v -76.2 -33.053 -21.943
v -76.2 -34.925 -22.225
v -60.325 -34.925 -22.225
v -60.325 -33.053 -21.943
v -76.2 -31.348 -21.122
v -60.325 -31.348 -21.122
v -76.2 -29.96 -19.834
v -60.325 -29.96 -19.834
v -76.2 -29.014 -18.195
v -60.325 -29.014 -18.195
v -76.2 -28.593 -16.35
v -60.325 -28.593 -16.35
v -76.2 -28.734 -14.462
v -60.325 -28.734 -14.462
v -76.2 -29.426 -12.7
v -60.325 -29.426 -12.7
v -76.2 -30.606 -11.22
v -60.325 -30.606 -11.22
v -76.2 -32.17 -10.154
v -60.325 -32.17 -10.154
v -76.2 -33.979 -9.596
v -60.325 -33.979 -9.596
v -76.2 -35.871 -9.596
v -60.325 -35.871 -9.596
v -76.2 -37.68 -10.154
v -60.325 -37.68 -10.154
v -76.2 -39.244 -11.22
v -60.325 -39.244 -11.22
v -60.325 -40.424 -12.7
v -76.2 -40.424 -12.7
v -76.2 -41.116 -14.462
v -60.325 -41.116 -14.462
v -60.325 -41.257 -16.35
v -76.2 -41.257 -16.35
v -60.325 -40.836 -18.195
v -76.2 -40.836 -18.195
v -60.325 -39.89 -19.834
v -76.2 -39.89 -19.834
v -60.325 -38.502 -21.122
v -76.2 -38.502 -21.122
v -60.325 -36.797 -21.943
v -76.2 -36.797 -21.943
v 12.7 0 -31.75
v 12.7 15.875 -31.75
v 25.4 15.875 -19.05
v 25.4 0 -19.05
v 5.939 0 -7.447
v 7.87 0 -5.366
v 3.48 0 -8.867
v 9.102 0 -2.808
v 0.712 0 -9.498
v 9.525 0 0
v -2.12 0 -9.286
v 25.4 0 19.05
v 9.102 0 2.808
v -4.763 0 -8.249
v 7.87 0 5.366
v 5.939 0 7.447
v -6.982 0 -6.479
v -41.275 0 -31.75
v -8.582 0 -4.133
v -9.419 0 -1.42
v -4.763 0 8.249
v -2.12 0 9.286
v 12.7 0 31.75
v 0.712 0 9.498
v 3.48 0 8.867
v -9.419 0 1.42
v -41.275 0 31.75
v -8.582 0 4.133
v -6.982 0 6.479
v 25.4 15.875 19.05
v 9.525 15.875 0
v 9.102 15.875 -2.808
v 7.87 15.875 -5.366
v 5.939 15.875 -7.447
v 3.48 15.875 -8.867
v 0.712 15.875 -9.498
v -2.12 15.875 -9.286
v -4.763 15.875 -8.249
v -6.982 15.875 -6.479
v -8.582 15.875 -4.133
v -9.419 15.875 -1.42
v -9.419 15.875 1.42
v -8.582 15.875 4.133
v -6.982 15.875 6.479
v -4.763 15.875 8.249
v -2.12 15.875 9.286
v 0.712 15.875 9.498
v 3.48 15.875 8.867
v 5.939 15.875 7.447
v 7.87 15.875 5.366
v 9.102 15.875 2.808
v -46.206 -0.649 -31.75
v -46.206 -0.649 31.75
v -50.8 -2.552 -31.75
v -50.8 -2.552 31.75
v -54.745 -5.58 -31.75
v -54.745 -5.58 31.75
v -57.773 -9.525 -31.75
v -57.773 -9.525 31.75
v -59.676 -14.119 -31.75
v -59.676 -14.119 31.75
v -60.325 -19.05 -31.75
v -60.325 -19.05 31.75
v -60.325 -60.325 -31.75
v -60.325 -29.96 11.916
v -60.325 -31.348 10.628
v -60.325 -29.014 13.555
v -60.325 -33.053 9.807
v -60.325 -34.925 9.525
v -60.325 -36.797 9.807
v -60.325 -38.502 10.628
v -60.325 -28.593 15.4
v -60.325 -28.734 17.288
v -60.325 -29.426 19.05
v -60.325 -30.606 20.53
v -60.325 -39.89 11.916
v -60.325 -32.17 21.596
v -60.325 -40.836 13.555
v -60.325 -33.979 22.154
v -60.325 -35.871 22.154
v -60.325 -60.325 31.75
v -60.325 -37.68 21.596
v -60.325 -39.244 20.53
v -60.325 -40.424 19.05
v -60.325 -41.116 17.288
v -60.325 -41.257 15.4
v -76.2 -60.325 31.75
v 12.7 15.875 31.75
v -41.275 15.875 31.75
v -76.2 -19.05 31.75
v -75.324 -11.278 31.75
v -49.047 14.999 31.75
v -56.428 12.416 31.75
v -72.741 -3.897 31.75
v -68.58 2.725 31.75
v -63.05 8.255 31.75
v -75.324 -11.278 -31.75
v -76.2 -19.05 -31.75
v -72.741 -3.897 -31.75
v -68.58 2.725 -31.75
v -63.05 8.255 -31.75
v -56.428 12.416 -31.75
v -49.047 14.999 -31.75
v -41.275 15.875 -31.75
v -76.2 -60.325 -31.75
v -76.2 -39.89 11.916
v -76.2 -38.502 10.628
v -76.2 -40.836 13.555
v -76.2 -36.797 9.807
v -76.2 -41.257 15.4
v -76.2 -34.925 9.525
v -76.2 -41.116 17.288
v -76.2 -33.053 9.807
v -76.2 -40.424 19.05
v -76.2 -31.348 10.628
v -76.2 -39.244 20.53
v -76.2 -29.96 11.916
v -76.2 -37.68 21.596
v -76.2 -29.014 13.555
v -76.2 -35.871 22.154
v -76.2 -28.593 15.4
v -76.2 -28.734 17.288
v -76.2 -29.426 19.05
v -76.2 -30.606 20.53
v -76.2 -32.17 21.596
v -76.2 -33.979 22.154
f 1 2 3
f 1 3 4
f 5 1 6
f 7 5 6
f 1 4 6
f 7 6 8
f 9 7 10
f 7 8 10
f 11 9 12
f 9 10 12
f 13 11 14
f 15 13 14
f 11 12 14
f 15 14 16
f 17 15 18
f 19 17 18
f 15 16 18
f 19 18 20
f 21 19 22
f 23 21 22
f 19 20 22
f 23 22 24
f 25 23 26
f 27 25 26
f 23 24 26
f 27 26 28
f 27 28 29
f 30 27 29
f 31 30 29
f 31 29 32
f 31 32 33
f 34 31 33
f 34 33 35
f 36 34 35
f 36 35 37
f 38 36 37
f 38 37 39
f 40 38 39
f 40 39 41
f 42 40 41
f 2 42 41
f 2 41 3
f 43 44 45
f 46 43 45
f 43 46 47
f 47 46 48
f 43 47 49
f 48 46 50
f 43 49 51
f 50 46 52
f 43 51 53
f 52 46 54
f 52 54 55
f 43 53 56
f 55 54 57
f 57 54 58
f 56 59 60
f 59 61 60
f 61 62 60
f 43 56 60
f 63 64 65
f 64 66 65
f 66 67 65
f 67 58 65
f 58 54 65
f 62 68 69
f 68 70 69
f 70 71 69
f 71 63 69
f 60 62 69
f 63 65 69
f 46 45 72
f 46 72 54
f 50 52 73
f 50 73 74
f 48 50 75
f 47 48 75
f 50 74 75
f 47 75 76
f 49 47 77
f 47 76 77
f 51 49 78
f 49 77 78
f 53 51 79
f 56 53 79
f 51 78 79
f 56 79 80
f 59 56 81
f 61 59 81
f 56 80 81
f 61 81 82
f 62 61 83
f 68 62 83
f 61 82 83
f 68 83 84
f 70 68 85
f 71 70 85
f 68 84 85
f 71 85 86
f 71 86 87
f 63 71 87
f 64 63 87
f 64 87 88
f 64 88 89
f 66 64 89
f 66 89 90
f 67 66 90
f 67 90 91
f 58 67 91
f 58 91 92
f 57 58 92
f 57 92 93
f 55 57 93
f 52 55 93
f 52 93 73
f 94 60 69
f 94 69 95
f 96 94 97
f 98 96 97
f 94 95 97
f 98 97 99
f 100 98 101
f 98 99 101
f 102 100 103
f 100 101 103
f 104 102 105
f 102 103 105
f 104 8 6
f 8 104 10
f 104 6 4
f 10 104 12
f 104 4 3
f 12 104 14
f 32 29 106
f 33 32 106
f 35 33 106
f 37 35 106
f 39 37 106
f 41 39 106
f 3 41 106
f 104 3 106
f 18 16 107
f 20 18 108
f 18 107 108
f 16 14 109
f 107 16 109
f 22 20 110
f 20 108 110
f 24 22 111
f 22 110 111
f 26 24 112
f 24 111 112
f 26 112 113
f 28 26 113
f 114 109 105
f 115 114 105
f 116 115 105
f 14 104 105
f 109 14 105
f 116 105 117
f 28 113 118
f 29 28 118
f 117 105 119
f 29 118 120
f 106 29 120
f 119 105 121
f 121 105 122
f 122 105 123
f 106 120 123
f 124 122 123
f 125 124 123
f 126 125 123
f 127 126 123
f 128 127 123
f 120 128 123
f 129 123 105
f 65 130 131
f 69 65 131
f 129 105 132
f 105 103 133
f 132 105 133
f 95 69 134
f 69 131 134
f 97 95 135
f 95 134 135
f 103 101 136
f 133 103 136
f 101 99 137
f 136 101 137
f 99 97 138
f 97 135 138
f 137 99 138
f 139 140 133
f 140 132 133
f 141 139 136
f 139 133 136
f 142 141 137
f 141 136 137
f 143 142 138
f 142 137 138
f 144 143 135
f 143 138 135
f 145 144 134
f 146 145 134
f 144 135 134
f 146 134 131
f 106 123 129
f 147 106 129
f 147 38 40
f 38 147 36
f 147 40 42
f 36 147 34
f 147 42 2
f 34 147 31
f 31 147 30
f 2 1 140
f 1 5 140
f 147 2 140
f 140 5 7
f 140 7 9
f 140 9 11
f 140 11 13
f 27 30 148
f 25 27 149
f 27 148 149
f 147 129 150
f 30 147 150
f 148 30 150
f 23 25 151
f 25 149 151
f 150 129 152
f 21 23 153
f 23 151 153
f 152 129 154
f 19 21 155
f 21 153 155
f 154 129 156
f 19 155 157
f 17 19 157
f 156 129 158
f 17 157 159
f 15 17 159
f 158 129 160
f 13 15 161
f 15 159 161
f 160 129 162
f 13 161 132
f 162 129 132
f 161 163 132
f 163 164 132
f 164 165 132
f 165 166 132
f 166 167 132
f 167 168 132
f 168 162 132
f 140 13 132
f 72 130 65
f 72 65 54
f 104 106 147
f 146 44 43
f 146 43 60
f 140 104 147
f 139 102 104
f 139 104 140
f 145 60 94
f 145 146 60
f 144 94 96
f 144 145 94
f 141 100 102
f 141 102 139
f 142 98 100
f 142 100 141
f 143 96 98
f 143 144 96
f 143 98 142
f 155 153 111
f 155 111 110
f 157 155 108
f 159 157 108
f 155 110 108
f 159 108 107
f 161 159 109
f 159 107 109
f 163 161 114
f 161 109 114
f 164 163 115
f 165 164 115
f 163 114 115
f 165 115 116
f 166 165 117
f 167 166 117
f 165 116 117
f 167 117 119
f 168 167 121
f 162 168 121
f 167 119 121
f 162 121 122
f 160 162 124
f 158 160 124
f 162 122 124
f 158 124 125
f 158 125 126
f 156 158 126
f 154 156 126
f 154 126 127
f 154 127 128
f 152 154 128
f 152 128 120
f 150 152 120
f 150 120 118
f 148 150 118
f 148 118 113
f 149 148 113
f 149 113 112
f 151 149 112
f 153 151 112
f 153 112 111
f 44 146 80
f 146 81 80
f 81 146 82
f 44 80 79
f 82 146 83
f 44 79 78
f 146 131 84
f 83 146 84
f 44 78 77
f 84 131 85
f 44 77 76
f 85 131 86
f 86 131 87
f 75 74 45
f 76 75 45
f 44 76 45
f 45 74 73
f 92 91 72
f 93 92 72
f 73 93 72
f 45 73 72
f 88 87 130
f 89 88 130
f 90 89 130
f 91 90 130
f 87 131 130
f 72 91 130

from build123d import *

# Parameters (mm, degrees)
HITCH_PROFILE_FOR_EXTRUSION_DEPTH = 31.75
SKETCH2_R                         = 9.525
BALL_ANCHOR_HOLE_DEPTH            = 77.2
F_45_DEG_CORNERS_DEPTH            = 77.2
BOLT_HOLE_X_2_REACH               = 17.875
SKETCH4_R                         = 6.35


with BuildPart() as part:
    # Sketch1 → Hitch Profile for Extrusion (new body, symmetric)
    with BuildSketch(Plane.XY):
        with BuildLine():
            Line((-76.2, -60.325), (-76.2, -19.05))
            ThreePointArc((-76.2, -19.05), (-65.970704333, 5.645704333), (-41.275, 15.875))
            Line((-41.275, 15.875), (25.4, 15.875))
            Line((25.4, 15.875), (25.4, 0))
            Line((25.4, 0), (-41.275, 0))
            ThreePointArc((-41.275, 0), (-54.745384182, -5.579615818), (-60.325, -19.05))
            Line((-60.325, -19.05), (-60.325, -60.325))
            Line((-60.325, -60.325), (-76.2, -60.325))
        make_face()
    extrude(amount=HITCH_PROFILE_FOR_EXTRUSION_DEPTH, both=True)

    # Sketch2 → Ball Anchor hole (cut, through all)
    with BuildSketch(Plane(origin=(0, 15.875, 0), x_dir=(1, 0, 0), z_dir=(0, 1, 0))):
        Circle(SKETCH2_R)
    extrude(amount=-BALL_ANCHOR_HOLE_DEPTH, mode=Mode.SUBTRACT)

    # Sketch3 → 45 Deg Corners (cut, through all)
    with BuildSketch(Plane(origin=(0, 15.875, 0), x_dir=(1, 0, 0), z_dir=(0, 1, 0))):
        Polygon((12.7, 31.75), (25.4, 19.05), (25.4, 31.75), align=None)
        Polygon((12.7, -31.75), (25.4, -19.05), (25.4, -31.75), align=None)
    extrude(amount=-F_45_DEG_CORNERS_DEPTH, mode=Mode.SUBTRACT)

    # Sketch4 → Bolt Hole x 2 (cut, up to next)
    with BuildSketch(Plane(origin=(-60.325, 0, 0), x_dir=(0, 0, -1), z_dir=(1, 0, 0)), mode=Mode.PRIVATE) as bolt_hole_x_2_sk1:
        with Locations((-15.875, -34.925)):
            Circle(SKETCH4_R)
    bolt_hole_x_2_tool1 = extrude(bolt_hole_x_2_sk1.sketch, amount=-BOLT_HOLE_X_2_REACH, mode=Mode.PRIVATE) & part.part
    add(bolt_hole_x_2_tool1.solids().sort_by_distance((-60.325, -34.925, 15.875))[0], mode=Mode.SUBTRACT)
    # Sketch4 → Bolt Hole x 2 (cut, up to next)
    with BuildSketch(Plane(origin=(-60.325, 0, 0), x_dir=(0, 0, -1), z_dir=(1, 0, 0)), mode=Mode.PRIVATE) as bolt_hole_x_2_sk2:
        with Locations((15.875, -34.925)):
            Circle(SKETCH4_R)
    bolt_hole_x_2_tool2 = extrude(bolt_hole_x_2_sk2.sketch, amount=-BOLT_HOLE_X_2_REACH, mode=Mode.PRIVATE) & part.part
    add(bolt_hole_x_2_tool2.solids().sort_by_distance((-60.325, -34.925, -15.875))[0], mode=Mode.SUBTRACT)


solid = part.part
